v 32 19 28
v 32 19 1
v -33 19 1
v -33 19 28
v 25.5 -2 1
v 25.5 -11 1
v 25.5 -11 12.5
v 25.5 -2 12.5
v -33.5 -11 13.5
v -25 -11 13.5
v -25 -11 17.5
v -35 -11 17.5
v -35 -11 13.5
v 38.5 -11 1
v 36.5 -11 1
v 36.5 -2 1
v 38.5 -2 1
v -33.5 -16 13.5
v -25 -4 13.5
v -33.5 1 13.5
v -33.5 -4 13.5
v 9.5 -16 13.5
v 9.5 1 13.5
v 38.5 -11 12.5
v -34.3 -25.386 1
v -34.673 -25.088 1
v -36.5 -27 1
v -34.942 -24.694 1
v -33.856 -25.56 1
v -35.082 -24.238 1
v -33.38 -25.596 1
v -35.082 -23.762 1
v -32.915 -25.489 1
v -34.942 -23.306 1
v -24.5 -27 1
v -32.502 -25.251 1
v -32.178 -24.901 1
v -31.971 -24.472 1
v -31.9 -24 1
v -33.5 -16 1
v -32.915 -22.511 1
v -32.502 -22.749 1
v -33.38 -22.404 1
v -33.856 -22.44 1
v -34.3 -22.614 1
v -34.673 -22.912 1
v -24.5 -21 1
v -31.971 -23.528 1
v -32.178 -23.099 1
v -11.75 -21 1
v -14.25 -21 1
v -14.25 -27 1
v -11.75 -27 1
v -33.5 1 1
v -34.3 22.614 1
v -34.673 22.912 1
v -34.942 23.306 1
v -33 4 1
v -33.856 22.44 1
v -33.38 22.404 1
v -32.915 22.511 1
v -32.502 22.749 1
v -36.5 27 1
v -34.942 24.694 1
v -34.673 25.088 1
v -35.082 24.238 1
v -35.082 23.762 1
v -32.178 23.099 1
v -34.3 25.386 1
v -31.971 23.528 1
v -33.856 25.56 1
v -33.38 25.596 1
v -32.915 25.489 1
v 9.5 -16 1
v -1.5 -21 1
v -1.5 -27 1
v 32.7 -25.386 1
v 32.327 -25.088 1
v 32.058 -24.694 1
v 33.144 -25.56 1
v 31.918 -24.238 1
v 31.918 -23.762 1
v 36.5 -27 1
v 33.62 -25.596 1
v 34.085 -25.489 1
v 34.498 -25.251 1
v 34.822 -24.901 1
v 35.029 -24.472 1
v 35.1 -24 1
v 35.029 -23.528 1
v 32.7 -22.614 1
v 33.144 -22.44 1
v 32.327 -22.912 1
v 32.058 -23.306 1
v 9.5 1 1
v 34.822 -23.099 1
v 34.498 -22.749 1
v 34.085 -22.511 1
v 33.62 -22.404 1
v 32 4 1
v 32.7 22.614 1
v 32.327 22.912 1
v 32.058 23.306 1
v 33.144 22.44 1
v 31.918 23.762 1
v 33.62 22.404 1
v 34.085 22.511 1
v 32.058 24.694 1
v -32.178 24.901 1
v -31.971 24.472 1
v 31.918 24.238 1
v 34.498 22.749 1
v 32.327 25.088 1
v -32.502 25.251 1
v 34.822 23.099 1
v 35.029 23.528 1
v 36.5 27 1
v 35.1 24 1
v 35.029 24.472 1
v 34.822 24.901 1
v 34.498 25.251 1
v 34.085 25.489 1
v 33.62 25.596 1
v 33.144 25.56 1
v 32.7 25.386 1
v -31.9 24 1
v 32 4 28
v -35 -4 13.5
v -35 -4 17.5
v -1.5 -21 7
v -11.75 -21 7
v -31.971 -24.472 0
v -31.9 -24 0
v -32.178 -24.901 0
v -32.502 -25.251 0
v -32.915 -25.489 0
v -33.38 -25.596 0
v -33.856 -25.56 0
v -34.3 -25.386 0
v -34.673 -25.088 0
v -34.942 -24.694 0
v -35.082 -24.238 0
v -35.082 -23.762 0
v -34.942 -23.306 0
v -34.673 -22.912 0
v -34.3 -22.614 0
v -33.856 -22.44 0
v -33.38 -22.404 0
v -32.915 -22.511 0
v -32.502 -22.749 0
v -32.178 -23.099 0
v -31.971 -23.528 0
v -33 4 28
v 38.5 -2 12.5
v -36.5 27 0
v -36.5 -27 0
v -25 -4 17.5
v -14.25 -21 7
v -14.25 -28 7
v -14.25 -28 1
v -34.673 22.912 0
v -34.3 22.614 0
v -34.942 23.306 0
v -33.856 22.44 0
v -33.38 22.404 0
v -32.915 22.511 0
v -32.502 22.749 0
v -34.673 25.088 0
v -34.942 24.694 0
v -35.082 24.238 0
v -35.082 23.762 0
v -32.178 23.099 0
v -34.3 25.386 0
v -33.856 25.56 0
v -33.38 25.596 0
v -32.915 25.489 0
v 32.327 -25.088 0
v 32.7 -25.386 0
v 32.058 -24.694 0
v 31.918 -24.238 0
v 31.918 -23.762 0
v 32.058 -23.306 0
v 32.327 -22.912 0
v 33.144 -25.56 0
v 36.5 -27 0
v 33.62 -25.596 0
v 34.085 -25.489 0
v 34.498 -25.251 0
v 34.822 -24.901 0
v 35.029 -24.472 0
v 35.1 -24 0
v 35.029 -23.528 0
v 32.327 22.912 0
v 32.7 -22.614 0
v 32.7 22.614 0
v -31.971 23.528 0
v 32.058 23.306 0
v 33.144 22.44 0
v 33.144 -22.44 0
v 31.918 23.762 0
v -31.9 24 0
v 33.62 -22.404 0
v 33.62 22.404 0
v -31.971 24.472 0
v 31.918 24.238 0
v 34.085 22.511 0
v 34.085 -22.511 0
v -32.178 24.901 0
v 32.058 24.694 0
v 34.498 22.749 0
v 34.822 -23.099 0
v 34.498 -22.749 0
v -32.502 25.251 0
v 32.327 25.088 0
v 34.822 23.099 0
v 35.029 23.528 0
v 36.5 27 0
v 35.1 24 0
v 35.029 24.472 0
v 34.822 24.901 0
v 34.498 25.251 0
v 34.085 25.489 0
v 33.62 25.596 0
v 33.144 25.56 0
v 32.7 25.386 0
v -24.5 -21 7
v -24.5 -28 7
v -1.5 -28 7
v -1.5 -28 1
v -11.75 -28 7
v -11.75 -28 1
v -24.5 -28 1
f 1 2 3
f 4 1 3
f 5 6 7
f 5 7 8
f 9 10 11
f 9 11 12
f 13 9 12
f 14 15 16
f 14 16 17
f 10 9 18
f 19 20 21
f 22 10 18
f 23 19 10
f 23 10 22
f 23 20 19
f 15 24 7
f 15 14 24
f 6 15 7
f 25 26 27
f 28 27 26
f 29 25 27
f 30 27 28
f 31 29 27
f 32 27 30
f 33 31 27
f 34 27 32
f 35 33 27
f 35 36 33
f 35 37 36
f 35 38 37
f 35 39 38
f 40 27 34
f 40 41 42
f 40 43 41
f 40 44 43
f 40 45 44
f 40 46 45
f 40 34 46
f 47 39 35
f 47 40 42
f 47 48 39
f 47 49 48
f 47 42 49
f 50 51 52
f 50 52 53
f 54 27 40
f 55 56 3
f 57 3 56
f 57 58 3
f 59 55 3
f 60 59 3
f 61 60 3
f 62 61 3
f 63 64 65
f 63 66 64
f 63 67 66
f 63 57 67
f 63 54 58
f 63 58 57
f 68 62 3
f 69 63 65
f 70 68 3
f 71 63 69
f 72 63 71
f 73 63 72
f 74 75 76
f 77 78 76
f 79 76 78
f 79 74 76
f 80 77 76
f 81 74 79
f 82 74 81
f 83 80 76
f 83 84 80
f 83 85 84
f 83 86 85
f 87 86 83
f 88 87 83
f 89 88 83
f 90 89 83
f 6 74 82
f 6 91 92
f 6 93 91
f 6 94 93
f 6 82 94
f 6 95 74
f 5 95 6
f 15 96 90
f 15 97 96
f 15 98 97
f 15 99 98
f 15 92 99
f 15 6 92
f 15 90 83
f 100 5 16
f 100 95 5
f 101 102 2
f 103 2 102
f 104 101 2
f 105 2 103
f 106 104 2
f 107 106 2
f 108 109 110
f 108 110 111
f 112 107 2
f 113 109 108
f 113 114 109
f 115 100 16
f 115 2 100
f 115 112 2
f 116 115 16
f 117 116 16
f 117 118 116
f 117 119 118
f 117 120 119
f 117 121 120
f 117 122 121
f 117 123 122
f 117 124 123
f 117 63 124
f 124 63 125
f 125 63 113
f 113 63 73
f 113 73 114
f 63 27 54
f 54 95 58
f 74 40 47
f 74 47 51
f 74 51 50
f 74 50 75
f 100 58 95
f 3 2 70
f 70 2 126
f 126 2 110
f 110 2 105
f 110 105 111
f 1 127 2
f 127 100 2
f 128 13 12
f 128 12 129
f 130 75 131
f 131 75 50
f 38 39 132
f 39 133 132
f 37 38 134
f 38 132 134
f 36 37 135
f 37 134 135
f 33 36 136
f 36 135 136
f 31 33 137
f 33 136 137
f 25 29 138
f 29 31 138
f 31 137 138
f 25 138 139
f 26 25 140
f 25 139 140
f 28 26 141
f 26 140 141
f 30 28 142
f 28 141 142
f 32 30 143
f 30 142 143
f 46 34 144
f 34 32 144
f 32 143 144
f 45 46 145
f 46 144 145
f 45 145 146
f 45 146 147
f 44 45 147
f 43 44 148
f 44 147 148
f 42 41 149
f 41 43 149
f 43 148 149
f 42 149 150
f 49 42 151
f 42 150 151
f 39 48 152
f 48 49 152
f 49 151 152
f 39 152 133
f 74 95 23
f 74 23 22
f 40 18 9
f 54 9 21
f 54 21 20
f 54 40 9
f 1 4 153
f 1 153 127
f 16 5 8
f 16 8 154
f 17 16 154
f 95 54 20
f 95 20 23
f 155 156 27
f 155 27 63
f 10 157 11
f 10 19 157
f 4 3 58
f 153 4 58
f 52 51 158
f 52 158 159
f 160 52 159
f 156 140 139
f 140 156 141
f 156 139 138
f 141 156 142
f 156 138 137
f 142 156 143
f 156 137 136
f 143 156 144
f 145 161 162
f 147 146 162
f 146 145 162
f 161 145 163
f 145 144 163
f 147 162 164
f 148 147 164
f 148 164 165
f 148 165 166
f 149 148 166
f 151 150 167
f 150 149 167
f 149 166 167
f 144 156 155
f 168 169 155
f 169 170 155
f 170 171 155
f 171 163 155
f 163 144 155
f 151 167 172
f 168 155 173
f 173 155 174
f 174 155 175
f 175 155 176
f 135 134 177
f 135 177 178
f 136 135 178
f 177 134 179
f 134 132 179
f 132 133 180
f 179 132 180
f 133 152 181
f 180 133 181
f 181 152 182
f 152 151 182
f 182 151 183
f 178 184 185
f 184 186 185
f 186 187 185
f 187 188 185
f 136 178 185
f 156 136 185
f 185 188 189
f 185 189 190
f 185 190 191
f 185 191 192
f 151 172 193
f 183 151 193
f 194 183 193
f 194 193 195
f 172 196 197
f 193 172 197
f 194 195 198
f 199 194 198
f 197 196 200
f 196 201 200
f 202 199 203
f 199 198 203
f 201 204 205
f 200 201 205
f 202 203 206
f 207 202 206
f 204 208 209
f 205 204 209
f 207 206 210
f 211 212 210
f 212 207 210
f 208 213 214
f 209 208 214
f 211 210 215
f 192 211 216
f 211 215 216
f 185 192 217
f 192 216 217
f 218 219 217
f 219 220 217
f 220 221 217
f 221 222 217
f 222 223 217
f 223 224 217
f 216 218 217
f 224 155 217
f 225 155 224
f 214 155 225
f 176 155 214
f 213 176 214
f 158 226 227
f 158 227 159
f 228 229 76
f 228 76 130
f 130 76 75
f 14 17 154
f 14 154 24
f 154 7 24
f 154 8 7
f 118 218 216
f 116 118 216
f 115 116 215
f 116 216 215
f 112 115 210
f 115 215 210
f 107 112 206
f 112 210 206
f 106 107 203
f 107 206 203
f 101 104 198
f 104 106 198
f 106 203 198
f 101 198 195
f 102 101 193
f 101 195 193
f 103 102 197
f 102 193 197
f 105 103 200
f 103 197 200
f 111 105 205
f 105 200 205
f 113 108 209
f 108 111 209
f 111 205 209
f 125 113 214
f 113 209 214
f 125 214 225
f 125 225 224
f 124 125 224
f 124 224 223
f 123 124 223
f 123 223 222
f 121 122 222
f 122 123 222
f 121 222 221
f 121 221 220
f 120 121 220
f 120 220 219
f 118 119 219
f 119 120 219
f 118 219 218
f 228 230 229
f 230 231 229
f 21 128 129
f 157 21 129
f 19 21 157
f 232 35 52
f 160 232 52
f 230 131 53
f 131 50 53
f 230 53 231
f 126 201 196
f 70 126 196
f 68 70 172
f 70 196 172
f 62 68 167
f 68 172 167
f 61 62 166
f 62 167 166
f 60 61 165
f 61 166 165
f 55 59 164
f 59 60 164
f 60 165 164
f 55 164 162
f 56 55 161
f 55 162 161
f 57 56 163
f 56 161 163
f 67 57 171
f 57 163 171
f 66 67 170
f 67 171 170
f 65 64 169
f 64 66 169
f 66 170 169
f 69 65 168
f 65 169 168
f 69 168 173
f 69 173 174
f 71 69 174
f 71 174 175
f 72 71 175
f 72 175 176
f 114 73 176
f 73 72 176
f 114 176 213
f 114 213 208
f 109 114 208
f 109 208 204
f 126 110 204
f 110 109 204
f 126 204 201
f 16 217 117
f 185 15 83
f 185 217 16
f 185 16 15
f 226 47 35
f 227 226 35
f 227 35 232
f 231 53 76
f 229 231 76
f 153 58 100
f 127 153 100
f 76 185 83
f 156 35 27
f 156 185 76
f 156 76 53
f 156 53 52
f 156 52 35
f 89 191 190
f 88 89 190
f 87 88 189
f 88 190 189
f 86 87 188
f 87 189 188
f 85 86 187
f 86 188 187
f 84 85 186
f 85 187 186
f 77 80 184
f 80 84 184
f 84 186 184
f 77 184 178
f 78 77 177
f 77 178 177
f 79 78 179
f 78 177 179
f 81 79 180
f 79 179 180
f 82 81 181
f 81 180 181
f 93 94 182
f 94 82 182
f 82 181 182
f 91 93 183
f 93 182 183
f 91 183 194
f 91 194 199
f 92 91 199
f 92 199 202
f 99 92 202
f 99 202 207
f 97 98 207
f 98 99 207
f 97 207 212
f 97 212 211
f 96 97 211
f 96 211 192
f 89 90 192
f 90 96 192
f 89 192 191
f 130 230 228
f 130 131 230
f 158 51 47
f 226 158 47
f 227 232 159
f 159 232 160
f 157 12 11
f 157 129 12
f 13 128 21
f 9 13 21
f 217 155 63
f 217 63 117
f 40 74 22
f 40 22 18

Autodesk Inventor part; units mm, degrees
ref_plane "YZ Plane" through (0, 0, 0) normal (1, 0, 0) x (0, 1, 0)
ref_plane "XZ Plane" through (0, 0, 0) normal (0, 1, 0) x (-1, 0, 0)
ref_plane "XY Plane" through (0, 0, 0) normal (0, 0, 1) x (1, 0, 0)
sketch "Эскиз1" plane through (0, 0, 0) normal (0, 0, 1) x (1, 0, 0)
  line L0 (36.5, -27) -> (-36.5, -27)
  line L1 (-36.5, -27) -> (-36.5, 27)
  line L2 (-36.5, 27) -> (36.5, 27)
  line L3 (36.5, 27) -> (36.5, -27)
  line L4 (36.5, -27) -> (-36.5, 27) construction
  line L5 (-36.5, -27) -> (36.5, 27) construction
  circle A0 centre (-33.5, -24) radius 1.6
  circle A1 centre (-33.5, 24) radius 1.6
  circle A2 centre (33.5, 24) radius 1.6
  circle A3 centre (33.5, -24) radius 1.6
  line L6 (-35.1, 24) -> (36.5, 24) construction
  line L7 (-33.5, 27) -> (-33.5, -27) construction
  line L8 (-36.5, -24) -> (36.5, -24) construction
  line L9 (33.5, 27) -> (33.5, -27) construction
  point P0 (0, 0)
  dimension "d6" = 3.2
  dimension "d0" = 73
  dimension "d1" = 54
  dimension "d2" = 3
  dimension "d3" = 3
  dimension "d4" = 3
  dimension "d5" = 3
extrude "Выдавливание1" add sketch "Эскиз1" along normal blind 1
sketch "Эскиз2" plane through (0, 0, 1) normal (0, 0, 1) x (1, 0, 0)
  line L0 (25.5, -2) -> (38.5, -2)
  line L1 (38.5, -2) -> (38.5, -11)
  line L2 (38.5, -11) -> (25.5, -11)
  line L3 (25.5, -11) -> (25.5, -2)
  line L4 (-36.5, -27) -> (36.5, -27) projected
  line L5 (36.5, -27) -> (36.5, 27) projected
  point P0 (0, 0)
  dimension "d9" = 13
  dimension "d10" = 9
  dimension "d11" = 16
  dimension "d12" = 2
extrude "Выдавливание2" add sketch "Эскиз2" along normal blind 11.5
sketch "Эскиз3" plane through (0, 0, 1) normal (0, 0, 1) x (1, 0, 0)
  line L0 (-24.5, -28) -> (-1.5, -28)
  line L1 (-1.5, -28) -> (-1.5, -21)
  line L2 (-1.5, -21) -> (-24.5, -21)
  line L3 (-24.5, -21) -> (-24.5, -28)
  line L4 (-36.5, -27) -> (36.5, -27) projected
  line L5 (-36.5, 27) -> (-36.5, -27) projected
  line L6 (-14.25, -21) -> (-14.25, -28)
  line L7 (-11.75, -21) -> (-11.75, -28)
  point P0 (0, 0)
  dimension "d15" = 23
  dimension "d16" = 7
  dimension "d17" = 1
  dimension "d18" = 12
  dimension "d21" = 2.5
  dimension "d22" = 10.25
extrude "Выдавливание3" add sketch "Эскиз3" along normal blind 6 contours L3 L4 L6 L0 | L3 L2 L6 L4 | L7 L4 L1 L0 | L7 L2 L1 L4
sketch "Эскиз4" plane through (0, 0, 1) normal (0, 0, 1) x (1, 0, 0)
  line L0 (-33.5, 1) -> (9.5, 1)
  line L1 (9.5, 1) -> (9.5, -16)
  line L2 (9.5, -16) -> (-33.5, -16)
  line L3 (-33.5, -16) -> (-33.5, 1)
  line L4 (-36.5, -27) -> (-24.5, -27) projected
  line L5 (-36.5, 27) -> (-36.5, -27) projected
  point P0 (0, 0)
  dimension "d23" = 17
  dimension "d24" = 43
  dimension "d25" = 11
  dimension "d26" = 3
extrude "Выдавливание4" add sketch "Эскиз4" along normal blind 12.5
sketch "Эскиз5" plane through (0, 0, 13.5) normal (0, 0, 1) x (1, 0, 0)
  line L0 (-25, -11) -> (-35, -11)
  line L1 (-35, -11) -> (-35, -4)
  line L2 (-35, -4) -> (-25, -4)
  line L3 (-25, -4) -> (-25, -11)
  line L4 (-25, -11) -> (-35, -4) construction
  line L5 (-35, -11) -> (-25, -4) construction
  line L6 (-35, -7.5) -> (-25, -7.5) construction
  line L7 (-33.5, 1) -> (-33.5, -16) projected
  point P0 (0, 0)
  point P1 (-30, -7.5)
  point P2 (-33.5, -7.5)
  dimension "d29" = 10
  dimension "d30" = 7
  dimension "d31" = 1.5
extrude "Выдавливание5" add sketch "Эскиз5" along normal blind 4
sketch "Эскиз6" plane through (0, 0, 1) normal (0, 0, 1) x (1, 0, 0)
  line L0 (32, 19) -> (-33, 19)
  line L1 (-33, 19) -> (-33, 4)
  line L2 (-33, 4) -> (32, 4)
  line L3 (32, 4) -> (32, 19)
  line L4 (36.5, 27) -> (-36.5, 27) projected
  line L5 (-36.5, 27) -> (-36.5, -27) projected
  point P0 (0, 0)
  dimension "d34" = 15
  dimension "d35" = 65
  dimension "d36" = 8
  dimension "d37" = 3.5
extrude "Выдавливание6" add sketch "Эскиз6" along normal blind 27
equation "\"d3\" = d2"
equation "\"d4\" = d2"
equation "\"d5\" = d2"
equation "\"d22\" = -0.5 * d21 + 0.5 * d15"
properties part number "Плата"
